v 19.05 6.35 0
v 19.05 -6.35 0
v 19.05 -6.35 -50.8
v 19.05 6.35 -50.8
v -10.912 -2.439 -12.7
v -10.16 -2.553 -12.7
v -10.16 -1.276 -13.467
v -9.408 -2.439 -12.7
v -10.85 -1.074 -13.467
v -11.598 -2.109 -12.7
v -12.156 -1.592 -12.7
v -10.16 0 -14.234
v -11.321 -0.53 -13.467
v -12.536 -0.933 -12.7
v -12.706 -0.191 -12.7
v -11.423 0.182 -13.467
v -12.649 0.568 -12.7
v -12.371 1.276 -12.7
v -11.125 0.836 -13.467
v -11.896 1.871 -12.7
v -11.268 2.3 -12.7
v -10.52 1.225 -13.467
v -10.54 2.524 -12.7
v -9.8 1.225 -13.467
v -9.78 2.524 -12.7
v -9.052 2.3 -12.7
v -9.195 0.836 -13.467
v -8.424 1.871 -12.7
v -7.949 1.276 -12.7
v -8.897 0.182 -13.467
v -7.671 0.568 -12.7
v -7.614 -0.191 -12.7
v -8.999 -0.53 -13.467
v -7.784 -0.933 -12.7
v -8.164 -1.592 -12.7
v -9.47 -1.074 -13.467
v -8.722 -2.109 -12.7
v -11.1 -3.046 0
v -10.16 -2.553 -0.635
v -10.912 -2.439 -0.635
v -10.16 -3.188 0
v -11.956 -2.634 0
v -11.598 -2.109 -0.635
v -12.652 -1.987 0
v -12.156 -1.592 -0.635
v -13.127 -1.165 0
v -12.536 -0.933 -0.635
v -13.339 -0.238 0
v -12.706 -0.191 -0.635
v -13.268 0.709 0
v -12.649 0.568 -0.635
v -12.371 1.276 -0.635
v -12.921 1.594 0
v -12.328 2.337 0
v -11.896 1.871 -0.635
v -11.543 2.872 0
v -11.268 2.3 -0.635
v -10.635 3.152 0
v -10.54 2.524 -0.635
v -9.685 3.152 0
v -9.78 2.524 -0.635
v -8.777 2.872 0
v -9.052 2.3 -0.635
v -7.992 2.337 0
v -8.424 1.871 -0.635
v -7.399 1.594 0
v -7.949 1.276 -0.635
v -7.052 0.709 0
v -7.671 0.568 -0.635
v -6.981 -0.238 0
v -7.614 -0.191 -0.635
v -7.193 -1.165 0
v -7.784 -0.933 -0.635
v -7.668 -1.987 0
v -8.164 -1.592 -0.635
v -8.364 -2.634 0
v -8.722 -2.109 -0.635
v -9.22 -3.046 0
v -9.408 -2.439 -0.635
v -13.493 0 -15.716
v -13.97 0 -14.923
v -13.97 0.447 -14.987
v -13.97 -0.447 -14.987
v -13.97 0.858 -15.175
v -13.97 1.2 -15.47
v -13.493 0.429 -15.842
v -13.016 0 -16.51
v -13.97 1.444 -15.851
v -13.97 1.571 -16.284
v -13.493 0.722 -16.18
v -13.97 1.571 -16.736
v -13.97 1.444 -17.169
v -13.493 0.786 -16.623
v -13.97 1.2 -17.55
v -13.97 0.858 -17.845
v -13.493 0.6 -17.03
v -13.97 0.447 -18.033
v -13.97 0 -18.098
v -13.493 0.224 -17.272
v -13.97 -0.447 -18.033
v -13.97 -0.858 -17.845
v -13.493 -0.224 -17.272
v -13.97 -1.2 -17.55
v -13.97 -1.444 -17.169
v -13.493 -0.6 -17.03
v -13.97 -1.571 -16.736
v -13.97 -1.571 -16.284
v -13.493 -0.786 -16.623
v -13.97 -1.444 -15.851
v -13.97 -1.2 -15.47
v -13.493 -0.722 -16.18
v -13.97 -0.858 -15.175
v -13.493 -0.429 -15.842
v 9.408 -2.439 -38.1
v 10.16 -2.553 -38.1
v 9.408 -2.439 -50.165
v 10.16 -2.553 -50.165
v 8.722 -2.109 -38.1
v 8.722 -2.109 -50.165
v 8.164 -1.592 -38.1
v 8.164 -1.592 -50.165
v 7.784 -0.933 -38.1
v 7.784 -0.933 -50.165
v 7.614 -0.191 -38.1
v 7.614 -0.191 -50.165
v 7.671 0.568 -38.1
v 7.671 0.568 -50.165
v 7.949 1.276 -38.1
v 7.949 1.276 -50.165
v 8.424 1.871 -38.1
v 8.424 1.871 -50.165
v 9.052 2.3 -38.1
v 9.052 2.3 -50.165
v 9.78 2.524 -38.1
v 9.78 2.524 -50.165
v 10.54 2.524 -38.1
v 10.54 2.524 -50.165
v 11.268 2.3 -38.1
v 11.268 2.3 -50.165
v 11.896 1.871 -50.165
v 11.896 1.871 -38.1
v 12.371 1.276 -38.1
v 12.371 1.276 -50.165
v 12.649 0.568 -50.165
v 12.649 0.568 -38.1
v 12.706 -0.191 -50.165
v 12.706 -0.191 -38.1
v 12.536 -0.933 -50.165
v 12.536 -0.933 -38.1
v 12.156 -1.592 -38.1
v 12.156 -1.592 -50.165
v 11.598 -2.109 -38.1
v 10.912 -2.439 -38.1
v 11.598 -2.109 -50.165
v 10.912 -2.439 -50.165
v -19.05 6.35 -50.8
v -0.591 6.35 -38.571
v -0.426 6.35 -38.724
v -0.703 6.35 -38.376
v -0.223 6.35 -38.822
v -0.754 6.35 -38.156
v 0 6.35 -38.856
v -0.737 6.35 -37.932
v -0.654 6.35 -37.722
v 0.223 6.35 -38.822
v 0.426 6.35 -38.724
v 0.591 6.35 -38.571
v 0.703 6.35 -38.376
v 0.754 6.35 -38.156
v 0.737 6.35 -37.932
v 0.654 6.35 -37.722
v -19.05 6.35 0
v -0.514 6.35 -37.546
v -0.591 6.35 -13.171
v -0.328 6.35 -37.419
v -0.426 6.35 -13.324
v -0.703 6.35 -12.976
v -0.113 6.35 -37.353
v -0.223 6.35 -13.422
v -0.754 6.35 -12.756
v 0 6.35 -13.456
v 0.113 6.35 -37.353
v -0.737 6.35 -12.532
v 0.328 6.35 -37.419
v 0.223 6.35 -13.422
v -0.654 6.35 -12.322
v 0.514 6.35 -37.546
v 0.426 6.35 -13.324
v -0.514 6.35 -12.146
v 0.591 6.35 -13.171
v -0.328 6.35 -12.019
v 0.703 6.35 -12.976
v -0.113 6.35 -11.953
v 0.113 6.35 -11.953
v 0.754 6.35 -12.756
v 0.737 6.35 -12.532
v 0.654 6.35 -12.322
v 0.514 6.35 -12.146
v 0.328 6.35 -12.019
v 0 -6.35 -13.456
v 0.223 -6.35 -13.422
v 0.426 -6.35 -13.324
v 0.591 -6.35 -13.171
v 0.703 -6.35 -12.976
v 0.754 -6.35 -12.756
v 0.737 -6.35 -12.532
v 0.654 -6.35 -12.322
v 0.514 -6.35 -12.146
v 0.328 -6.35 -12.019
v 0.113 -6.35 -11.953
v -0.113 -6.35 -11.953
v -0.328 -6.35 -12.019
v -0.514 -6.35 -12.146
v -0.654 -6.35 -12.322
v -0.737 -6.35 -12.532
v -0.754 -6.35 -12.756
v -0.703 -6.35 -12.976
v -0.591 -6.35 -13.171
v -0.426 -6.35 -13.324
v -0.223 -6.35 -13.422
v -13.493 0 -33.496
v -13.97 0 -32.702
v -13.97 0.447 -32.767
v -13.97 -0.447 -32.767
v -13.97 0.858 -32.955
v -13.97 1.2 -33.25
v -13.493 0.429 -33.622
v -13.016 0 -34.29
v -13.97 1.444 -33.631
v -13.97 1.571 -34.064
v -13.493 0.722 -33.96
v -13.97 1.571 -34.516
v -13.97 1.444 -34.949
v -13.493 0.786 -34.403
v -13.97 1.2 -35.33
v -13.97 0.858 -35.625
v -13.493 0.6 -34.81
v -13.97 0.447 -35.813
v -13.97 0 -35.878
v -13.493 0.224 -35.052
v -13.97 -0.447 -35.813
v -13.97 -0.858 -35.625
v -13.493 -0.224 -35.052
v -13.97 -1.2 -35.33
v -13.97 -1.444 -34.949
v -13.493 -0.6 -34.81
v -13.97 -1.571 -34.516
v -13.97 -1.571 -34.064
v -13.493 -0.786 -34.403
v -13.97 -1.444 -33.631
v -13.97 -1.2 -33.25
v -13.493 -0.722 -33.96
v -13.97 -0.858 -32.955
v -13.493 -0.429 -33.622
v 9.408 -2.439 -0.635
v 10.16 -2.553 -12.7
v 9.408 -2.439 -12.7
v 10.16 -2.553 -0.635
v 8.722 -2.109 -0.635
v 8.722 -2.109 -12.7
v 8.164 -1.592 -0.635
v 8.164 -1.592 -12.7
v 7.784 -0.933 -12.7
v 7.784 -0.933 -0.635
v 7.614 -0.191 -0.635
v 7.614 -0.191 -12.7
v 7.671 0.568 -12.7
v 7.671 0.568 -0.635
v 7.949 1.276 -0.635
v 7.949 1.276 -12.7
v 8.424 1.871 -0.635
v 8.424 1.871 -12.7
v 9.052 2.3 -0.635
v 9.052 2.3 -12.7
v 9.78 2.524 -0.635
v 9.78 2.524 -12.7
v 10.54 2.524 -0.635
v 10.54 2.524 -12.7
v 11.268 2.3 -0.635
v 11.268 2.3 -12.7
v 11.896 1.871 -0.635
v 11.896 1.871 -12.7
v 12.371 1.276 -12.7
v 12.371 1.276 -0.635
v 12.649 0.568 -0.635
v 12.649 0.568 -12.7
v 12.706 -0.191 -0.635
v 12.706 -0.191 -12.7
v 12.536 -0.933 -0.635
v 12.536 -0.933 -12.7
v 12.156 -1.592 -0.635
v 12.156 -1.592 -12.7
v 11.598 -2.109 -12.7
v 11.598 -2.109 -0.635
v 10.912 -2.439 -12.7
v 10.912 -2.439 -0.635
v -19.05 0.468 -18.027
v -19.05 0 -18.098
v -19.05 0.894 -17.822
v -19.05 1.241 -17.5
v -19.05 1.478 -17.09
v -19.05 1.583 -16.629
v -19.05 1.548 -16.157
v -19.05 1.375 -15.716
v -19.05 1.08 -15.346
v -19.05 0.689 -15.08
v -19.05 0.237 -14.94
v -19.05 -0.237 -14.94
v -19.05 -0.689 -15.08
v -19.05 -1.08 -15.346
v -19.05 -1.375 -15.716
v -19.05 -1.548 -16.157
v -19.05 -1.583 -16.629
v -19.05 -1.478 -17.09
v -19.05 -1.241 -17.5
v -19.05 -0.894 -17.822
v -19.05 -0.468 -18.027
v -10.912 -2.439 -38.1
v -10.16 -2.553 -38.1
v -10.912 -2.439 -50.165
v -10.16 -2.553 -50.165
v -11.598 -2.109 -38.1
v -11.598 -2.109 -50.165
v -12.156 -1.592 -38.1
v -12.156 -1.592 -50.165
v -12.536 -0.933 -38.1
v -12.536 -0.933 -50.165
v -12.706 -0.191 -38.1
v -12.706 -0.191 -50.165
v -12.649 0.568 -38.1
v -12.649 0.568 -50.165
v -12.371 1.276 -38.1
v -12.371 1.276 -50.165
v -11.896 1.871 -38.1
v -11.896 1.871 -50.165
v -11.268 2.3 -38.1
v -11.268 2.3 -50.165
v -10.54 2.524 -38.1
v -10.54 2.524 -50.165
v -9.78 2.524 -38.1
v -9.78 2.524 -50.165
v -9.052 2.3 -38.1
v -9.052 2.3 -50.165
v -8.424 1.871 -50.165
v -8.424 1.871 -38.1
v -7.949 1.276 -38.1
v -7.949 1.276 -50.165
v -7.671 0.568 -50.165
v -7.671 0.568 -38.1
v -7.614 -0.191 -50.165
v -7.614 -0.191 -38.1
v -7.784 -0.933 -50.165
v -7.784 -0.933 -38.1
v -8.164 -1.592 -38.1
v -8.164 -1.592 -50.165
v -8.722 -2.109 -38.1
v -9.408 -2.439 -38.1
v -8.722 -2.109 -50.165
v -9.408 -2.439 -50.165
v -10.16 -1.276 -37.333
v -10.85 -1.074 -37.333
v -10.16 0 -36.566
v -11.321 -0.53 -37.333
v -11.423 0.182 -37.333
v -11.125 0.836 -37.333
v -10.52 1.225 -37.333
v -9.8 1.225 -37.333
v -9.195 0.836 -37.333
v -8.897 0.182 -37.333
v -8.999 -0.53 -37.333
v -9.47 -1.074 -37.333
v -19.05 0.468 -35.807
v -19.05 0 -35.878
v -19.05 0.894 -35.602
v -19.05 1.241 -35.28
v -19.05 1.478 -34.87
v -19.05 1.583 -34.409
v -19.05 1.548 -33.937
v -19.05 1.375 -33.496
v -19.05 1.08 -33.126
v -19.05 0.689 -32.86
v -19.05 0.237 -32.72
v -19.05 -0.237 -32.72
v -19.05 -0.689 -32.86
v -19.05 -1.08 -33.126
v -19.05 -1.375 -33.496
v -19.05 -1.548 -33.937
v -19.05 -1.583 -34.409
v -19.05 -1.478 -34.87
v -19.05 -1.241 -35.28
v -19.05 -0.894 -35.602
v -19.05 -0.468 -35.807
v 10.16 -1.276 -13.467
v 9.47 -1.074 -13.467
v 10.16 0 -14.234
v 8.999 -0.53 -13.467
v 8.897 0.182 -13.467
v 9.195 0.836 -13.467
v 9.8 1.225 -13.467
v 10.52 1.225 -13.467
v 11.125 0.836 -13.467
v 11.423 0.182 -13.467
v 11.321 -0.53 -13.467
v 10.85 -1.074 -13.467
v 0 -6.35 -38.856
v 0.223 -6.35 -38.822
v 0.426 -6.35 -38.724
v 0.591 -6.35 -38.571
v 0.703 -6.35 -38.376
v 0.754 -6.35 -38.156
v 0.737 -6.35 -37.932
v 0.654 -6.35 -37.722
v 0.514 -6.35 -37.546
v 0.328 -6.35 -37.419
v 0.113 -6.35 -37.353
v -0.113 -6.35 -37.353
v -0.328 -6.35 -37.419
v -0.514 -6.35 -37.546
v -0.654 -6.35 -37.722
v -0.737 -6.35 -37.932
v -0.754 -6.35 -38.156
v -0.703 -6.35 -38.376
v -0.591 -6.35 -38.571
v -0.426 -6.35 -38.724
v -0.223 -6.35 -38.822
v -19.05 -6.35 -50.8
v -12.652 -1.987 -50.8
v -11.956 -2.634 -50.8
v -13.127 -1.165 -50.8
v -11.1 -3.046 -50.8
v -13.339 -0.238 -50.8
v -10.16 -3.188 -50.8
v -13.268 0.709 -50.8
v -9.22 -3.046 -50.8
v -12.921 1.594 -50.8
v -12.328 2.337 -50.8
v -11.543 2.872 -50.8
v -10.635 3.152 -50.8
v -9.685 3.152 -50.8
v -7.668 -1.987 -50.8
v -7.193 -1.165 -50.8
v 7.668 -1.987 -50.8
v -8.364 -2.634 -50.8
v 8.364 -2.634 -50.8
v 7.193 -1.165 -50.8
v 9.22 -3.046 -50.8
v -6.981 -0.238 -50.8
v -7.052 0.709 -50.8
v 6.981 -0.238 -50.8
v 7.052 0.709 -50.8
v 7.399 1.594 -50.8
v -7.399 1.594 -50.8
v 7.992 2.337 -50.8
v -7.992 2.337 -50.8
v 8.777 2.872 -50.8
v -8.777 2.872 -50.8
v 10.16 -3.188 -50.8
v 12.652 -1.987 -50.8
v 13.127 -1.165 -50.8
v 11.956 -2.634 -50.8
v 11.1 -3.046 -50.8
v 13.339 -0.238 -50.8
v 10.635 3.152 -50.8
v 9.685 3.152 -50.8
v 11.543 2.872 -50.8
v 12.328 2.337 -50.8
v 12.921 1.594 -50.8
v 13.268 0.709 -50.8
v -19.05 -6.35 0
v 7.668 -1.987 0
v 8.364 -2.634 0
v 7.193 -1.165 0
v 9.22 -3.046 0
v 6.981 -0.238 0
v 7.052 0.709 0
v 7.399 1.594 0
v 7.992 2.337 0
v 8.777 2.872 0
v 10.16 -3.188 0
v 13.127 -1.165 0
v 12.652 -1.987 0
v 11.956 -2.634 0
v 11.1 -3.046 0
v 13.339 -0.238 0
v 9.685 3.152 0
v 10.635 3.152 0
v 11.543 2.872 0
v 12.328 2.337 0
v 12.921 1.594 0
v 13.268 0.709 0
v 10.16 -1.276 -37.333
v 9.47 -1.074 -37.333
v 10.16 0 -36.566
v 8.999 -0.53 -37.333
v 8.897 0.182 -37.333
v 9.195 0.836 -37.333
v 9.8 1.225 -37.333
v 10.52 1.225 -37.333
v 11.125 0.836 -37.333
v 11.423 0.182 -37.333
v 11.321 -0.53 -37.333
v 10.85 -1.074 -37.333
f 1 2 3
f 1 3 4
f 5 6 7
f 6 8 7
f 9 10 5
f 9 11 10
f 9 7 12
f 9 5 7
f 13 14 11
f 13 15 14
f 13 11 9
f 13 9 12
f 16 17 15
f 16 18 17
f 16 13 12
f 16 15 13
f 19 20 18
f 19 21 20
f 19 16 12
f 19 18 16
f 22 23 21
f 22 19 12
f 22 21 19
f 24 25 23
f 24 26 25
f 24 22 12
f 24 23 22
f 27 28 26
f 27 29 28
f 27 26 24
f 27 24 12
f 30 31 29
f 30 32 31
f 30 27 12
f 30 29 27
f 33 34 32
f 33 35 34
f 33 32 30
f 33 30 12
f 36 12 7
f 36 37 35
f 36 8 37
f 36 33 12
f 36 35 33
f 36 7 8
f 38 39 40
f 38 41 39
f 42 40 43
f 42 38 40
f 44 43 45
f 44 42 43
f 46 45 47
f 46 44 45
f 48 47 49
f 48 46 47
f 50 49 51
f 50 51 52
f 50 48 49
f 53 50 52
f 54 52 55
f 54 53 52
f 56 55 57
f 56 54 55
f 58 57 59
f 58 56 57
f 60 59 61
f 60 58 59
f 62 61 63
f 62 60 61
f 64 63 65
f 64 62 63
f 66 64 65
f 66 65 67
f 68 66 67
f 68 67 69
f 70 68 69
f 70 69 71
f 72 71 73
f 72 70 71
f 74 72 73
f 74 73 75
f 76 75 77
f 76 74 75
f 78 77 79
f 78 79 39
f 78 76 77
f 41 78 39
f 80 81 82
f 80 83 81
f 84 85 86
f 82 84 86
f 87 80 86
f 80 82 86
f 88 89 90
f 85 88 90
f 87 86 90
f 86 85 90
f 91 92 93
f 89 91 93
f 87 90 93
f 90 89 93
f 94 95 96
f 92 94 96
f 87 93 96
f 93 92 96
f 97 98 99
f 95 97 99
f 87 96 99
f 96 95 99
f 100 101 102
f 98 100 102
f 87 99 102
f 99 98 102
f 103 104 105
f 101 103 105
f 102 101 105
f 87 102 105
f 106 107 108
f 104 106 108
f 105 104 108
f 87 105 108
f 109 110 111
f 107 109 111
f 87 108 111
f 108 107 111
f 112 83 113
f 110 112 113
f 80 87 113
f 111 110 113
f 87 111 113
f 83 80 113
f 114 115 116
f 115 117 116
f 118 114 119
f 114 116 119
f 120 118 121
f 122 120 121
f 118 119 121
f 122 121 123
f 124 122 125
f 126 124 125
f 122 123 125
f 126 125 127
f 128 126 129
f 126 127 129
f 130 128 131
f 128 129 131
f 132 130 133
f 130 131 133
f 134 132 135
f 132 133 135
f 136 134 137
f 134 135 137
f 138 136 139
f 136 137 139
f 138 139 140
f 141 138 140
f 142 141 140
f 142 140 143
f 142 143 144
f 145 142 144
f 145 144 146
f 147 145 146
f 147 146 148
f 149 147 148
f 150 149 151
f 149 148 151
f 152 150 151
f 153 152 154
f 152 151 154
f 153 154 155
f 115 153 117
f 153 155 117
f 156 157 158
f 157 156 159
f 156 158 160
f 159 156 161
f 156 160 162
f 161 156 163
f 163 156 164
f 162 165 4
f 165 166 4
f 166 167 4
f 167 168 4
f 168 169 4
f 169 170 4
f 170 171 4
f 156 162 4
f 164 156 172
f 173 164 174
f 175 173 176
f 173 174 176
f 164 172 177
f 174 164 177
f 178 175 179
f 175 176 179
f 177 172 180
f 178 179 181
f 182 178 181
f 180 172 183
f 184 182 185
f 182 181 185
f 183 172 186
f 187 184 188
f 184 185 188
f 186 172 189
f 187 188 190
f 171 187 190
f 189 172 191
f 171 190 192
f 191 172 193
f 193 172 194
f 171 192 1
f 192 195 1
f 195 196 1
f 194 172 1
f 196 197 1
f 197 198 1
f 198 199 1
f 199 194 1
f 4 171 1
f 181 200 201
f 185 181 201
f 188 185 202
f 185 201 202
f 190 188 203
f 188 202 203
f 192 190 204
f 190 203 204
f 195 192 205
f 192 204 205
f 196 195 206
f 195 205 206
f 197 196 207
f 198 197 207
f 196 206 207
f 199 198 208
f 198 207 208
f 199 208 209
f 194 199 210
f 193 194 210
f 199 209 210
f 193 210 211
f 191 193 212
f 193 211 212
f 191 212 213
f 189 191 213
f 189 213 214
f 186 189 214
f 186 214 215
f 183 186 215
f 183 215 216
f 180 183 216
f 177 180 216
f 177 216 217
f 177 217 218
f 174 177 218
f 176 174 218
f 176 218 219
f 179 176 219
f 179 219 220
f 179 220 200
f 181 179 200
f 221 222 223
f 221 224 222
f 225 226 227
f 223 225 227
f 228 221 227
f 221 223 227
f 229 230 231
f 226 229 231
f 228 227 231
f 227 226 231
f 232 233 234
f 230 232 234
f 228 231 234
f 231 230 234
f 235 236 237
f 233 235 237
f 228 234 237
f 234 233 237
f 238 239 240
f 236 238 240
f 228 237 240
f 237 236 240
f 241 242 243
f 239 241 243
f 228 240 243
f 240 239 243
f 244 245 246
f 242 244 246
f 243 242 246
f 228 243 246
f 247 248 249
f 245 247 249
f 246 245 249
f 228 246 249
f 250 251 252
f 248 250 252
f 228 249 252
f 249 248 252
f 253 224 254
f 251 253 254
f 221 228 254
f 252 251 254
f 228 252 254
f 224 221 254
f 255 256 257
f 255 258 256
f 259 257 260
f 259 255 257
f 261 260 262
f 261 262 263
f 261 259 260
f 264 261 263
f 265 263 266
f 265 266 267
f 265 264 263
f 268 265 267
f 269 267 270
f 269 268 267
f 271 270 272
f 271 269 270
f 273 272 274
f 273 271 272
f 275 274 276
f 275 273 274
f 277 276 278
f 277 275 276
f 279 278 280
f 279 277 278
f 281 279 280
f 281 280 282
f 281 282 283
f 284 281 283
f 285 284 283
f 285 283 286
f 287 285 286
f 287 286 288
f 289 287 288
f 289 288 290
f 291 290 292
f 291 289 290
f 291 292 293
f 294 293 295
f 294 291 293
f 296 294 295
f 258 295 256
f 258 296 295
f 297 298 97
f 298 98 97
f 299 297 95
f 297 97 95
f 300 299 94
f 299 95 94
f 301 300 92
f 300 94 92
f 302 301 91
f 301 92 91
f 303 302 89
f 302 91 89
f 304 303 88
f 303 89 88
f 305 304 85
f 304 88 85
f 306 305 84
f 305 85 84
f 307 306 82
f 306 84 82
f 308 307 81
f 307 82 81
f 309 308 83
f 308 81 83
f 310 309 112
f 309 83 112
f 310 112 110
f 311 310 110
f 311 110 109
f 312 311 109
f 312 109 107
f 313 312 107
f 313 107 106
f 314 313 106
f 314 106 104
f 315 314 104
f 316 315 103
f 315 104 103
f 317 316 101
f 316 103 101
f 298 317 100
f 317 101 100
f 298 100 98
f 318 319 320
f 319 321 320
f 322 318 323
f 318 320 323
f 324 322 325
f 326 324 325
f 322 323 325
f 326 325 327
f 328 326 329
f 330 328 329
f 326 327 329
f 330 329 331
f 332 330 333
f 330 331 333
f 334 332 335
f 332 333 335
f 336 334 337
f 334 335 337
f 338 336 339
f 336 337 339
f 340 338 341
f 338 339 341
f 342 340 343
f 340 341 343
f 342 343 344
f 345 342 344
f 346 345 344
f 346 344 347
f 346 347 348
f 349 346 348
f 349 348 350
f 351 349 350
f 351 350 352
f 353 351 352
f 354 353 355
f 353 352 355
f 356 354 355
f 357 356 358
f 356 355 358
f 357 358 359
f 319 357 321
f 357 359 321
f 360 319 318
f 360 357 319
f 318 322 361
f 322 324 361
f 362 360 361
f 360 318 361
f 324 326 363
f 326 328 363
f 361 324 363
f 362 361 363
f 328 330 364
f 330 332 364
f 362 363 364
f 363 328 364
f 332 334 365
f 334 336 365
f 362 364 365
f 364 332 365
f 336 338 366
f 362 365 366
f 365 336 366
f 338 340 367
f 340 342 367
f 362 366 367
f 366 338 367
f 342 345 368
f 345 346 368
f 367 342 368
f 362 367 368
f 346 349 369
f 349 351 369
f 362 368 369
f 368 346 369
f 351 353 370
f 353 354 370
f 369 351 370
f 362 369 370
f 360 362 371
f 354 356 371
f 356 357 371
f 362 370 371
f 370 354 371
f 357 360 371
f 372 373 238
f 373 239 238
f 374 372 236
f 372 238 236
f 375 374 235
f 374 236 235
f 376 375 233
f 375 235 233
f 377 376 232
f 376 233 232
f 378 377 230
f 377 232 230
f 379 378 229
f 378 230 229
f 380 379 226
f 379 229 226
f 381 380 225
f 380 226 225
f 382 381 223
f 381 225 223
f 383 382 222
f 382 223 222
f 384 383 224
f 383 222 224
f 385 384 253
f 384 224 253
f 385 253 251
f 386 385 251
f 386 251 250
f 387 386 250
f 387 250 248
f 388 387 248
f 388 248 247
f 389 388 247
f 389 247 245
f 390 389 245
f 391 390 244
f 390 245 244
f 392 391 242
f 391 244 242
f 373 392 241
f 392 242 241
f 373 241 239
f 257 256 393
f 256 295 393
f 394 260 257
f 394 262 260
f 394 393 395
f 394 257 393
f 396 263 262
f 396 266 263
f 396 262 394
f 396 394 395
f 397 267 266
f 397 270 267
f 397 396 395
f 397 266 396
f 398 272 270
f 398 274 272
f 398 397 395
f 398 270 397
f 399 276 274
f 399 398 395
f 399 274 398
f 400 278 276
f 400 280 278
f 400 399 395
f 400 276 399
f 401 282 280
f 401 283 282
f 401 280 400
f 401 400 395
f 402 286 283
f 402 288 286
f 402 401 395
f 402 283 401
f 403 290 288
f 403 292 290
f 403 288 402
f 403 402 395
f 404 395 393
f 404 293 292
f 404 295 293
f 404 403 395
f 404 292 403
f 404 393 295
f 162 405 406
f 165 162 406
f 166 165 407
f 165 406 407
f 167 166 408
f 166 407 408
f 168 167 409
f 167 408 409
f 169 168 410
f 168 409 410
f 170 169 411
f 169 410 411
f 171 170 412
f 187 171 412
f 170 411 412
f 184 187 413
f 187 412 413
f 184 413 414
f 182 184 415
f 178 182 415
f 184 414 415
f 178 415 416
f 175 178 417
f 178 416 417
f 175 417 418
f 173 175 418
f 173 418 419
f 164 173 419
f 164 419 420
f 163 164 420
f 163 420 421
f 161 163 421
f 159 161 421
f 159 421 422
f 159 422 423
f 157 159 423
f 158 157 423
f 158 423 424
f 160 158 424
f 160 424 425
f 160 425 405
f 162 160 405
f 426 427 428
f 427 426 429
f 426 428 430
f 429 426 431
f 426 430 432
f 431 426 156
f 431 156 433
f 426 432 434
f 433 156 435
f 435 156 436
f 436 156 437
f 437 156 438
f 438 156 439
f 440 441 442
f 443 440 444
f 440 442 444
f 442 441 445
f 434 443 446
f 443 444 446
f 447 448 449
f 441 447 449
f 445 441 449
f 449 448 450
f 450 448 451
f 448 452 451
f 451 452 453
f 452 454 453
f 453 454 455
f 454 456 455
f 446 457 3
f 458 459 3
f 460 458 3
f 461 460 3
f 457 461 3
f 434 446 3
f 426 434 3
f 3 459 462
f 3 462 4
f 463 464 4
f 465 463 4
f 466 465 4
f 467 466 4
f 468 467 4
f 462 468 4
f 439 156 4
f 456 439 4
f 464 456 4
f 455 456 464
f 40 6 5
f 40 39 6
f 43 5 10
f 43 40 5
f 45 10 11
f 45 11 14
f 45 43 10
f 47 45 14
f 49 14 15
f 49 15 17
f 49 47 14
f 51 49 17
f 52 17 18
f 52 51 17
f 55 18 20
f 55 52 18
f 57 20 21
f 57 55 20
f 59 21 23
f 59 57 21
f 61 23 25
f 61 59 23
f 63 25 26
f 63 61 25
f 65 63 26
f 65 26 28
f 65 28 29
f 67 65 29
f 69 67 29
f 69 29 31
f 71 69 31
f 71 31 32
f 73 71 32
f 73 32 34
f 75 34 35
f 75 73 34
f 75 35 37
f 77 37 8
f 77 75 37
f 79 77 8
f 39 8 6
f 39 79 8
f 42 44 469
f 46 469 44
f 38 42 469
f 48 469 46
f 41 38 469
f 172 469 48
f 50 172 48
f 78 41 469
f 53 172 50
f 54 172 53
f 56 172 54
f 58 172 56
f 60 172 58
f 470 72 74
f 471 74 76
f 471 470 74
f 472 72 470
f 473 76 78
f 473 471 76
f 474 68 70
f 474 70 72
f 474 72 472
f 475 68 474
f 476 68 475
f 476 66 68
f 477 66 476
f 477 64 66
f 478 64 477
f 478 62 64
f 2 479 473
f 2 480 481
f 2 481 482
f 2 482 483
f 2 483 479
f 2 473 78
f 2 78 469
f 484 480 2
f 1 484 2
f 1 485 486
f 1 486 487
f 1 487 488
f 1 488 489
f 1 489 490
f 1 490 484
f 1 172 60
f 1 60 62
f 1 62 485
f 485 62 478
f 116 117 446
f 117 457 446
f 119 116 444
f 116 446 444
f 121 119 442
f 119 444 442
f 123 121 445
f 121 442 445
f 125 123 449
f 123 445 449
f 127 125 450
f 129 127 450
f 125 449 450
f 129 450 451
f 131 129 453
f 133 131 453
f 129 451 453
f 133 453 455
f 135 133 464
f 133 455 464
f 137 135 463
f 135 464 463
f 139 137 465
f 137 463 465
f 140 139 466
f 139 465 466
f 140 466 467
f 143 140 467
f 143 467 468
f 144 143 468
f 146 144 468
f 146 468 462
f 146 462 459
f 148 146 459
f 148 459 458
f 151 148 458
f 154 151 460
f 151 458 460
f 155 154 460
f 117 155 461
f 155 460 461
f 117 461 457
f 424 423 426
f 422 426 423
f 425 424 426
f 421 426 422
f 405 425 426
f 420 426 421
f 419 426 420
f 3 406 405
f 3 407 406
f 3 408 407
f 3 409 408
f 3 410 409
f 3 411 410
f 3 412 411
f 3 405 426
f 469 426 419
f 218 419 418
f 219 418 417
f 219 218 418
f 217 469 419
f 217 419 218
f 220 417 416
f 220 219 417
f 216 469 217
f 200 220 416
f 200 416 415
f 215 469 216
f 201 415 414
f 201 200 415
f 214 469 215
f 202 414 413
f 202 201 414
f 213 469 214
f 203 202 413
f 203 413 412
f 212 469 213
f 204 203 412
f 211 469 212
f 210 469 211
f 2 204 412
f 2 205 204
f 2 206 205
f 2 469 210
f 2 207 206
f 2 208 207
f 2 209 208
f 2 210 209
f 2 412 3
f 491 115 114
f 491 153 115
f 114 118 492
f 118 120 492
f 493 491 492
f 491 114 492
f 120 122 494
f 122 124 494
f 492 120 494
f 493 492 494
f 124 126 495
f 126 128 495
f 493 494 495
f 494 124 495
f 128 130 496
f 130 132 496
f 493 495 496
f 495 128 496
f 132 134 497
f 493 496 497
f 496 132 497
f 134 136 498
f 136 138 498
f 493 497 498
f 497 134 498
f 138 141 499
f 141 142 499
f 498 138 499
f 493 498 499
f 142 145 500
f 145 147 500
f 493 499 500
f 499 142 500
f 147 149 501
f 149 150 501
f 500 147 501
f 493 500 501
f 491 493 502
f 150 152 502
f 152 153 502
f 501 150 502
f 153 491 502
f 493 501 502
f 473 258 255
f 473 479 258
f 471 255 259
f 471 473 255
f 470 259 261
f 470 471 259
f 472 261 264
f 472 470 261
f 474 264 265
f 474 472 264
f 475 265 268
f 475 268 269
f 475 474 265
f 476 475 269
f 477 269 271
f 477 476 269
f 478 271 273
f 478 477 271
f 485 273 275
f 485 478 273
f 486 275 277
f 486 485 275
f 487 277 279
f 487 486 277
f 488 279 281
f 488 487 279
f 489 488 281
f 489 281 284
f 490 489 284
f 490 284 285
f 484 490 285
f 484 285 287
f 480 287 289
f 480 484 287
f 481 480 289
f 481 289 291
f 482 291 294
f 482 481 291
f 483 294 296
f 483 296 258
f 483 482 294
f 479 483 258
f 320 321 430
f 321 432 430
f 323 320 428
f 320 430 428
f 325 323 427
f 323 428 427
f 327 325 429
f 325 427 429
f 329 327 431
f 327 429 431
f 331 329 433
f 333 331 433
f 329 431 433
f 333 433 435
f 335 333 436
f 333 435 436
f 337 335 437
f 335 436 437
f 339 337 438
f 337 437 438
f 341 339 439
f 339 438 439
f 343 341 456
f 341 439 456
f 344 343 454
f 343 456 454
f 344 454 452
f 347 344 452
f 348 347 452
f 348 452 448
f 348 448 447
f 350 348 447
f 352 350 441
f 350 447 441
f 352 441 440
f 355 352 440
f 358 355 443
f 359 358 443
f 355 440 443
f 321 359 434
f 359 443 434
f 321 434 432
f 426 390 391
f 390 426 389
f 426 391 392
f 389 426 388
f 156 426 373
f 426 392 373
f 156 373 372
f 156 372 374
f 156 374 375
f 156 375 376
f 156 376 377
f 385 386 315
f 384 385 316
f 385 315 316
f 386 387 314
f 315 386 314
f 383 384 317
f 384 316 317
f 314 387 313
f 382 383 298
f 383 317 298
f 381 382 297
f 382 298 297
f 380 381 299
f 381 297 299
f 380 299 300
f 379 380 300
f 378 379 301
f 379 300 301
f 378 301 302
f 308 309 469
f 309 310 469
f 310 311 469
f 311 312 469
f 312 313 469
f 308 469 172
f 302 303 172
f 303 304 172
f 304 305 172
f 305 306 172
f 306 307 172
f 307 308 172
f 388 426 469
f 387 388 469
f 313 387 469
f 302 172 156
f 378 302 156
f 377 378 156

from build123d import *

# Parameters (mm, degrees)
SKETCH1_W                        = 38.1
SKETCH1_H                        = 12.7
BOSS_EXTRUDE1_DEPTH              = 50.8
F_1_4_20_TAPPED_HOLE1_AT_2_COUNT = 2
F_1_4_20_TAPPED_HOLE1_AT_2_PITCH = 20.32
F_1_64_TAPPED_HOLE1_D            = 1.5113
F_1_8_0_125_DIAMETER_HOLE1_D     = 3.175
F_1_8_0_125_DIAMETER_HOLE1_DEPTH = 5.08
F_1_8_0_125_DIAMETER_HOLE1_TIP   = 0.953866233


with BuildPart() as part:
    # Sketch1 → Boss-Extrude1 (new body)
    with BuildSketch(Plane.XY):
        Rectangle(SKETCH1_W, SKETCH1_H)
    extrude(amount=-BOSS_EXTRUDE1_DEPTH)

    # Sketch4 → 1/4-20 Tapped Hole1 (revolve, cut)
    with BuildSketch(Plane(origin=(-10.16, 0, 0), x_dir=(0, -1, 0), z_dir=(1, 0, 0))):
        Polygon((0, 0), (0, 14.233816902), (2.5527, 12.7), (2.5527, 0.635), (3.1877, 0), align=None)
    f_1_4_20_tapped_hole1 = revolve(axis=Axis((-10.16, 0, 6.35), (0, 0, -1)), mode=Mode.SUBTRACT)

    # 1/4-20 Tapped Hole1 at 2: 1/4-20 Tapped Hole1 ×2
    with Locations(*[(i * F_1_4_20_TAPPED_HOLE1_AT_2_PITCH, 0, 0) for i in range(1, F_1_4_20_TAPPED_HOLE1_AT_2_COUNT)]):
        add(f_1_4_20_tapped_hole1, mode=Mode.SUBTRACT)

    # Mirror1: 1/4-20 Tapped Hole1 across plane
    add(f_1_4_20_tapped_hole1.mirror(Plane.XY.offset(-25.4)), mode=Mode.SUBTRACT)

    # Mirror1 copy 1 sketch → Mirror1 copy 1 (revolve, cut)
    with BuildSketch(Plane(origin=(10.16, 0, -50.8), x_dir=(0, -1, 0), z_dir=(1, 0, 0))):
        Polygon((0, 0), (0, -14.233816902), (2.5527, -12.7), (2.5527, -0.635), (3.1877, 0), align=None)
    revolve(axis=Axis((10.16, 0, -57.15), (0, 0, -1)), mode=Mode.SUBTRACT)

    # #1-64 Tapped Hole1 (through all)
    with Locations(Plane(origin=(0, 6.35, -38.1), x_dir=(0, 0, 1), z_dir=(0, 1, 0))):
        with Locations((0, 0), (25.4, 0)):
            Hole(F_1_64_TAPPED_HOLE1_D / 2)

    # 1/8 (0.125) Diameter Hole1
    with Locations(Plane.ZY.offset(19.05)):
        with Locations((-34.29, 0), (-16.51, 0)):
            Hole(F_1_8_0_125_DIAMETER_HOLE1_D / 2, depth=F_1_8_0_125_DIAMETER_HOLE1_DEPTH)
            with Locations((0, 0, -(F_1_8_0_125_DIAMETER_HOLE1_DEPTH + F_1_8_0_125_DIAMETER_HOLE1_TIP / 2))):  # 118° drill point
                Cone(0, F_1_8_0_125_DIAMETER_HOLE1_D / 2, F_1_8_0_125_DIAMETER_HOLE1_TIP, mode=Mode.SUBTRACT)


solid = part.part
